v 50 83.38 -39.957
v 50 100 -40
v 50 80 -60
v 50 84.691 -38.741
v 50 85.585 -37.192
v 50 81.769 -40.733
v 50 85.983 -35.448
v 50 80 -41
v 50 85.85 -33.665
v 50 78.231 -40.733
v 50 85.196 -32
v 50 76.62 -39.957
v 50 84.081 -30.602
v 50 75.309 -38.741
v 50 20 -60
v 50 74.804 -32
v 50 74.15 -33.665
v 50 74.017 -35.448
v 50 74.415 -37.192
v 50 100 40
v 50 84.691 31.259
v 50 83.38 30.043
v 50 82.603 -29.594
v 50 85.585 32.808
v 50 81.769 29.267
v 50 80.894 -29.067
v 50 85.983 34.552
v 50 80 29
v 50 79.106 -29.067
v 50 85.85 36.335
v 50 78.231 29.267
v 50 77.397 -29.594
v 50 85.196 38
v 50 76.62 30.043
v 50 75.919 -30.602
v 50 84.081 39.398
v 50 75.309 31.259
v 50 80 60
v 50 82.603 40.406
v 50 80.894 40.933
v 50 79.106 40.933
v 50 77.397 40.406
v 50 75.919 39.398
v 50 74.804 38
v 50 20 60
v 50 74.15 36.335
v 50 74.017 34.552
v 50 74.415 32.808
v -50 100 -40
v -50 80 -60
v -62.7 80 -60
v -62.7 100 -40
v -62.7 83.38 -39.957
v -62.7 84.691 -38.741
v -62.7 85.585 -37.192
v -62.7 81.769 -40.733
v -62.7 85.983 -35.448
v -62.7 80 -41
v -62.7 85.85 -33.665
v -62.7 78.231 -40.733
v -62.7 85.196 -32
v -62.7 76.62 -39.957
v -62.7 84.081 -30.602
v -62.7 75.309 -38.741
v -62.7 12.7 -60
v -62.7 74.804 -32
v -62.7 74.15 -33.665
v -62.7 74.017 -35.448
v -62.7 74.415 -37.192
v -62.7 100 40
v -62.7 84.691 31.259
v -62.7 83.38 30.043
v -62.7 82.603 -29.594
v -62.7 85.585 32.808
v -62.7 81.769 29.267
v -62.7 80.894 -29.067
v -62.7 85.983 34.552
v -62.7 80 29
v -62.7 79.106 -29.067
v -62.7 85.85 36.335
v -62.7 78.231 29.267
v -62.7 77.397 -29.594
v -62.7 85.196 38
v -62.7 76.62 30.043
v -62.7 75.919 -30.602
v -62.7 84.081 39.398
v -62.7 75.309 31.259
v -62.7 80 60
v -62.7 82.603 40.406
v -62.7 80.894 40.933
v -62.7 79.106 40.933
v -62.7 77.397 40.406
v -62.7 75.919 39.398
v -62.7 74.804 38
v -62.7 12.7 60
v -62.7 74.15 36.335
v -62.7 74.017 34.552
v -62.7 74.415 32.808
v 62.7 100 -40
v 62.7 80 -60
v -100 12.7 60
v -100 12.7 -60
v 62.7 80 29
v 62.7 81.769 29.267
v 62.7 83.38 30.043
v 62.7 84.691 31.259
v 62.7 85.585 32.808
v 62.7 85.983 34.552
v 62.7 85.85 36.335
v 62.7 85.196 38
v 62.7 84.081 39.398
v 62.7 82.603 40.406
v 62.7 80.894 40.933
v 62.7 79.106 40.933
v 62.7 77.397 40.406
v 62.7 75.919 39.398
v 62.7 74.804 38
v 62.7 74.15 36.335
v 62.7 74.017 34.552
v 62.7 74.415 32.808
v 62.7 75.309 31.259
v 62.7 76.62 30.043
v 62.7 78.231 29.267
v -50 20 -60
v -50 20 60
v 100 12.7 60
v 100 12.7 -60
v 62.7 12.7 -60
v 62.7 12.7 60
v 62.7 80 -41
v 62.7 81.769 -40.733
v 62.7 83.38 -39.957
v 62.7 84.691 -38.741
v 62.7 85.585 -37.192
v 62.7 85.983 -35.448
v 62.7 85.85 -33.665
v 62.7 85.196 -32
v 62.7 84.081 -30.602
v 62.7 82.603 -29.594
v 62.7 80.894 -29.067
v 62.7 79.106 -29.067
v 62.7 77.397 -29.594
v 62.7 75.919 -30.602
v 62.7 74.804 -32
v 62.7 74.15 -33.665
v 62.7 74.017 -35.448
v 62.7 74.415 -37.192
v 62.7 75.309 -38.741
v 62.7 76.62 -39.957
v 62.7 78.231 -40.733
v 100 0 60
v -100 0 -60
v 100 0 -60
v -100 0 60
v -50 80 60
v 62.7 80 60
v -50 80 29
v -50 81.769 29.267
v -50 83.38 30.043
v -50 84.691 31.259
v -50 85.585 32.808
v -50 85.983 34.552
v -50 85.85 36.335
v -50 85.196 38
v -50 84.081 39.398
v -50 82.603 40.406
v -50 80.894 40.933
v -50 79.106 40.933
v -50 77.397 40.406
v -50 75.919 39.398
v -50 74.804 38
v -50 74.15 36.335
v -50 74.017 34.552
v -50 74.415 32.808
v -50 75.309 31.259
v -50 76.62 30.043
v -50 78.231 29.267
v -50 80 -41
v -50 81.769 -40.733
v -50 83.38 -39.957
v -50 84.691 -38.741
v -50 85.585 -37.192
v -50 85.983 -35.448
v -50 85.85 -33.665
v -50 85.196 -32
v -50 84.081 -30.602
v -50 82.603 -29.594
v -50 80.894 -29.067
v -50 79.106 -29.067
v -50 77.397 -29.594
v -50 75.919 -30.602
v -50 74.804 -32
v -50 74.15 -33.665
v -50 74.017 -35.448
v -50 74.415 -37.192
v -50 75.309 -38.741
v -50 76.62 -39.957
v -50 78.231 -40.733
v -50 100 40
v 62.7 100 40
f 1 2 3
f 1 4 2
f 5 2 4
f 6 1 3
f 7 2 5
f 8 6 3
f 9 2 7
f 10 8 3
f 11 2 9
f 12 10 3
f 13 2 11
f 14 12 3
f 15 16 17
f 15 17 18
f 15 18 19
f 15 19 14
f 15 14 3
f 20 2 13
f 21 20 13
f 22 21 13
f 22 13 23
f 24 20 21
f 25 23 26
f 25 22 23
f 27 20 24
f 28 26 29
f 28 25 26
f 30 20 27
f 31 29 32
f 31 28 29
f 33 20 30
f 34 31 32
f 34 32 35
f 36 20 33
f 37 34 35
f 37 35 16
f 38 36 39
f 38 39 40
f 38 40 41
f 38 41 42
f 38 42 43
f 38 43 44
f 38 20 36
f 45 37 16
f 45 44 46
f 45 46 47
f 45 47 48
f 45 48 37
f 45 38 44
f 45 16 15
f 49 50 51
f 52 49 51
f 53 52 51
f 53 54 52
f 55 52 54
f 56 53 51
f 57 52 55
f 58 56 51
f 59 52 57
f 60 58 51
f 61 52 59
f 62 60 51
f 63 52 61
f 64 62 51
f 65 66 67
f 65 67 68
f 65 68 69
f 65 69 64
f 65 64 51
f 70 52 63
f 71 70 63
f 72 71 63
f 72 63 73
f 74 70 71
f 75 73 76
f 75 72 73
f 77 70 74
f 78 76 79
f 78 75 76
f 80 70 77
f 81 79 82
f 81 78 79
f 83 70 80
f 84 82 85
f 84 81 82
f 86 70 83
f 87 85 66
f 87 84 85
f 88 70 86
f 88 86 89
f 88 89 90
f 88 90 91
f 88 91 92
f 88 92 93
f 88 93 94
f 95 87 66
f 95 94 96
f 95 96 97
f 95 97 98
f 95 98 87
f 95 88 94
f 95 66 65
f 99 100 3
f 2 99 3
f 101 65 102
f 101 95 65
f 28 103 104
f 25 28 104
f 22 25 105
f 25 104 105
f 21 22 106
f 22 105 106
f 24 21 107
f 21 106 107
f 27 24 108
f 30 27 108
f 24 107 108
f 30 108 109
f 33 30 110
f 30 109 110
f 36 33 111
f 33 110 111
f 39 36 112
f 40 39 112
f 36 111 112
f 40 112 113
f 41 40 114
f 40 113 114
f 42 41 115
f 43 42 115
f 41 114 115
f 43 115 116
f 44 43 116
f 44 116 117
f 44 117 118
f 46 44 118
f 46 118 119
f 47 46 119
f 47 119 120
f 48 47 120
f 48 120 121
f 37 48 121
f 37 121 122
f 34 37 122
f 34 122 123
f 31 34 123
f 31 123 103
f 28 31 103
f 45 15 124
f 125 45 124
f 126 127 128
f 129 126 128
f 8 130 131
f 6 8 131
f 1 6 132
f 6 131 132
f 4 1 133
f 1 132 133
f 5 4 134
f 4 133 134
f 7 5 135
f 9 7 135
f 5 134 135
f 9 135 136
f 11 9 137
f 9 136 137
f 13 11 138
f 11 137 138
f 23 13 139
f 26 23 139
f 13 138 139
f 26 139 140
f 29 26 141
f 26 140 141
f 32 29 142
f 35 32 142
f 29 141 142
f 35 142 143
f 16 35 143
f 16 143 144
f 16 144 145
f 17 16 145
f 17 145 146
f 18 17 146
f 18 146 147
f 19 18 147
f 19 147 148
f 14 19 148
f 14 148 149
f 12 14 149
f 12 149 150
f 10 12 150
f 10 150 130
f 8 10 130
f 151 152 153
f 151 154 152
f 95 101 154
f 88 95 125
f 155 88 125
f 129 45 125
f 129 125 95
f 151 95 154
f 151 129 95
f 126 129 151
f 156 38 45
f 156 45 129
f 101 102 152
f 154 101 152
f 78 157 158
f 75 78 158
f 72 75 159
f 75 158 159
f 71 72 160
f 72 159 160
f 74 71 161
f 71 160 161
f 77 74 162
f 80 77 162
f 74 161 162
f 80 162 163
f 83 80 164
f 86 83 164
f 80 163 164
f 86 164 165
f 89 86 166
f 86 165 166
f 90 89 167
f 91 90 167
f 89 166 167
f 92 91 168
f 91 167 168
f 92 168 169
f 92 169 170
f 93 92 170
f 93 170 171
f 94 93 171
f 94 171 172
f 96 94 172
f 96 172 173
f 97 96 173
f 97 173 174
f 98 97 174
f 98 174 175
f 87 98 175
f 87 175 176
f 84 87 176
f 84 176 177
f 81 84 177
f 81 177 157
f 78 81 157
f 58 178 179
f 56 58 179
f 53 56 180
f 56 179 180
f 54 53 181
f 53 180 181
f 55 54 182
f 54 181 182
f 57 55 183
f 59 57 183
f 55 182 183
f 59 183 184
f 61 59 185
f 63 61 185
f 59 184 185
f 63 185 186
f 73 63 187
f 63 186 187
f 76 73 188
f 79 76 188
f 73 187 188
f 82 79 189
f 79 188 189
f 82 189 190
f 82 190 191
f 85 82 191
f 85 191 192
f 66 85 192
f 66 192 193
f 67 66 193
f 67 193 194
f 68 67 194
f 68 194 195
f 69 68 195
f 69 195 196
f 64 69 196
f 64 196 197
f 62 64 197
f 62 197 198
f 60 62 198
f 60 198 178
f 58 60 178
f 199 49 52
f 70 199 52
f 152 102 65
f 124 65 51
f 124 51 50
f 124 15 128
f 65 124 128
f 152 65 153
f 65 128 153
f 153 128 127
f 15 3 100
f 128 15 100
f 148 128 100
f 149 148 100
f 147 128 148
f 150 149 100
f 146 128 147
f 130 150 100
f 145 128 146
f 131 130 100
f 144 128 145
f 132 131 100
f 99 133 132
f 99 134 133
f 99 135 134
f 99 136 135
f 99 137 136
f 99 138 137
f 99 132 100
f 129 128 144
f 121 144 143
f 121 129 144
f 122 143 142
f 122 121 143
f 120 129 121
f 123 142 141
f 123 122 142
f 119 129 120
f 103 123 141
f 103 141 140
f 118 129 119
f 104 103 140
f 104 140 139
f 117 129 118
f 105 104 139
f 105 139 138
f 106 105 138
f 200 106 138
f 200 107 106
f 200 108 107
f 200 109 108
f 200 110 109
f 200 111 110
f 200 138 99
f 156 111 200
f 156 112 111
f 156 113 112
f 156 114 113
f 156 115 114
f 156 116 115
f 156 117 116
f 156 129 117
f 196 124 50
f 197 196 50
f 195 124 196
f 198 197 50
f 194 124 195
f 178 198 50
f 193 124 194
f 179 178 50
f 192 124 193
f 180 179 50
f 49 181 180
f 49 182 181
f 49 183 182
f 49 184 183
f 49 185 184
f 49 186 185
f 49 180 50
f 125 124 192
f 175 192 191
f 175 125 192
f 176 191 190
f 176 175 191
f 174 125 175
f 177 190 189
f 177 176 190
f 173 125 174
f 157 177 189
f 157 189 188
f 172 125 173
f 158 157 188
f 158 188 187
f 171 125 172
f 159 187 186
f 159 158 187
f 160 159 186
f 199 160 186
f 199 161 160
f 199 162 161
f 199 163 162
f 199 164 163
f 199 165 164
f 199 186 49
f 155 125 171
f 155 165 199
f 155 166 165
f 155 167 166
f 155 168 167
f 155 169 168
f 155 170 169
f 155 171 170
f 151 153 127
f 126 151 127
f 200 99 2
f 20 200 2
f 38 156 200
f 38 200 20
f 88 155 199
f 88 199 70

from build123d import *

# Parameters (mm, degrees)
RESSALTO_EXTRUS_O1_DEPTH = 60
CHANFRO1_SIZE            = 20
ESBO_O2_R                = 6
CORTE_EXTRUS_O1_DEPTH    = 163.7


with BuildPart() as part:
    # Esboço1 → Ressalto-extrusão1 (new body, symmetric)
    with BuildSketch(Plane.XY):
        Polygon((-100, 0), (100, 0), (100, 12.7), (62.7, 12.7), (62.7, 100), (50, 100), (50, 20), (-50, 20), (-50, 100), (-62.7, 100), (-62.7, 12.7), (-100, 12.7), align=None)
    extrude(amount=RESSALTO_EXTRUS_O1_DEPTH, both=True)

    # Chanfro1
    chanfro1_edges = [part.edges().sort_by_distance(p)[0] for p in [
        (-56.35, 100, -60),
        (56.35, 100, 60),
        (56.35, 100, -60),
        (-56.35, 100, 60),
    ]]
    chamfer(chanfro1_edges, length=CHANFRO1_SIZE)

    # Esboço2 → Corte-extrusão1 (cut, through all)
    with BuildSketch(Plane(origin=(62.7, 0, 0), x_dir=(0, 0, -1), z_dir=(1, 0, 0))):
        with Locations((-35, 80)):
            Circle(ESBO_O2_R)
        with Locations((35, 80)):
            Circle(ESBO_O2_R)
    extrude(amount=-CORTE_EXTRUS_O1_DEPTH, mode=Mode.SUBTRACT)


solid = part.part
